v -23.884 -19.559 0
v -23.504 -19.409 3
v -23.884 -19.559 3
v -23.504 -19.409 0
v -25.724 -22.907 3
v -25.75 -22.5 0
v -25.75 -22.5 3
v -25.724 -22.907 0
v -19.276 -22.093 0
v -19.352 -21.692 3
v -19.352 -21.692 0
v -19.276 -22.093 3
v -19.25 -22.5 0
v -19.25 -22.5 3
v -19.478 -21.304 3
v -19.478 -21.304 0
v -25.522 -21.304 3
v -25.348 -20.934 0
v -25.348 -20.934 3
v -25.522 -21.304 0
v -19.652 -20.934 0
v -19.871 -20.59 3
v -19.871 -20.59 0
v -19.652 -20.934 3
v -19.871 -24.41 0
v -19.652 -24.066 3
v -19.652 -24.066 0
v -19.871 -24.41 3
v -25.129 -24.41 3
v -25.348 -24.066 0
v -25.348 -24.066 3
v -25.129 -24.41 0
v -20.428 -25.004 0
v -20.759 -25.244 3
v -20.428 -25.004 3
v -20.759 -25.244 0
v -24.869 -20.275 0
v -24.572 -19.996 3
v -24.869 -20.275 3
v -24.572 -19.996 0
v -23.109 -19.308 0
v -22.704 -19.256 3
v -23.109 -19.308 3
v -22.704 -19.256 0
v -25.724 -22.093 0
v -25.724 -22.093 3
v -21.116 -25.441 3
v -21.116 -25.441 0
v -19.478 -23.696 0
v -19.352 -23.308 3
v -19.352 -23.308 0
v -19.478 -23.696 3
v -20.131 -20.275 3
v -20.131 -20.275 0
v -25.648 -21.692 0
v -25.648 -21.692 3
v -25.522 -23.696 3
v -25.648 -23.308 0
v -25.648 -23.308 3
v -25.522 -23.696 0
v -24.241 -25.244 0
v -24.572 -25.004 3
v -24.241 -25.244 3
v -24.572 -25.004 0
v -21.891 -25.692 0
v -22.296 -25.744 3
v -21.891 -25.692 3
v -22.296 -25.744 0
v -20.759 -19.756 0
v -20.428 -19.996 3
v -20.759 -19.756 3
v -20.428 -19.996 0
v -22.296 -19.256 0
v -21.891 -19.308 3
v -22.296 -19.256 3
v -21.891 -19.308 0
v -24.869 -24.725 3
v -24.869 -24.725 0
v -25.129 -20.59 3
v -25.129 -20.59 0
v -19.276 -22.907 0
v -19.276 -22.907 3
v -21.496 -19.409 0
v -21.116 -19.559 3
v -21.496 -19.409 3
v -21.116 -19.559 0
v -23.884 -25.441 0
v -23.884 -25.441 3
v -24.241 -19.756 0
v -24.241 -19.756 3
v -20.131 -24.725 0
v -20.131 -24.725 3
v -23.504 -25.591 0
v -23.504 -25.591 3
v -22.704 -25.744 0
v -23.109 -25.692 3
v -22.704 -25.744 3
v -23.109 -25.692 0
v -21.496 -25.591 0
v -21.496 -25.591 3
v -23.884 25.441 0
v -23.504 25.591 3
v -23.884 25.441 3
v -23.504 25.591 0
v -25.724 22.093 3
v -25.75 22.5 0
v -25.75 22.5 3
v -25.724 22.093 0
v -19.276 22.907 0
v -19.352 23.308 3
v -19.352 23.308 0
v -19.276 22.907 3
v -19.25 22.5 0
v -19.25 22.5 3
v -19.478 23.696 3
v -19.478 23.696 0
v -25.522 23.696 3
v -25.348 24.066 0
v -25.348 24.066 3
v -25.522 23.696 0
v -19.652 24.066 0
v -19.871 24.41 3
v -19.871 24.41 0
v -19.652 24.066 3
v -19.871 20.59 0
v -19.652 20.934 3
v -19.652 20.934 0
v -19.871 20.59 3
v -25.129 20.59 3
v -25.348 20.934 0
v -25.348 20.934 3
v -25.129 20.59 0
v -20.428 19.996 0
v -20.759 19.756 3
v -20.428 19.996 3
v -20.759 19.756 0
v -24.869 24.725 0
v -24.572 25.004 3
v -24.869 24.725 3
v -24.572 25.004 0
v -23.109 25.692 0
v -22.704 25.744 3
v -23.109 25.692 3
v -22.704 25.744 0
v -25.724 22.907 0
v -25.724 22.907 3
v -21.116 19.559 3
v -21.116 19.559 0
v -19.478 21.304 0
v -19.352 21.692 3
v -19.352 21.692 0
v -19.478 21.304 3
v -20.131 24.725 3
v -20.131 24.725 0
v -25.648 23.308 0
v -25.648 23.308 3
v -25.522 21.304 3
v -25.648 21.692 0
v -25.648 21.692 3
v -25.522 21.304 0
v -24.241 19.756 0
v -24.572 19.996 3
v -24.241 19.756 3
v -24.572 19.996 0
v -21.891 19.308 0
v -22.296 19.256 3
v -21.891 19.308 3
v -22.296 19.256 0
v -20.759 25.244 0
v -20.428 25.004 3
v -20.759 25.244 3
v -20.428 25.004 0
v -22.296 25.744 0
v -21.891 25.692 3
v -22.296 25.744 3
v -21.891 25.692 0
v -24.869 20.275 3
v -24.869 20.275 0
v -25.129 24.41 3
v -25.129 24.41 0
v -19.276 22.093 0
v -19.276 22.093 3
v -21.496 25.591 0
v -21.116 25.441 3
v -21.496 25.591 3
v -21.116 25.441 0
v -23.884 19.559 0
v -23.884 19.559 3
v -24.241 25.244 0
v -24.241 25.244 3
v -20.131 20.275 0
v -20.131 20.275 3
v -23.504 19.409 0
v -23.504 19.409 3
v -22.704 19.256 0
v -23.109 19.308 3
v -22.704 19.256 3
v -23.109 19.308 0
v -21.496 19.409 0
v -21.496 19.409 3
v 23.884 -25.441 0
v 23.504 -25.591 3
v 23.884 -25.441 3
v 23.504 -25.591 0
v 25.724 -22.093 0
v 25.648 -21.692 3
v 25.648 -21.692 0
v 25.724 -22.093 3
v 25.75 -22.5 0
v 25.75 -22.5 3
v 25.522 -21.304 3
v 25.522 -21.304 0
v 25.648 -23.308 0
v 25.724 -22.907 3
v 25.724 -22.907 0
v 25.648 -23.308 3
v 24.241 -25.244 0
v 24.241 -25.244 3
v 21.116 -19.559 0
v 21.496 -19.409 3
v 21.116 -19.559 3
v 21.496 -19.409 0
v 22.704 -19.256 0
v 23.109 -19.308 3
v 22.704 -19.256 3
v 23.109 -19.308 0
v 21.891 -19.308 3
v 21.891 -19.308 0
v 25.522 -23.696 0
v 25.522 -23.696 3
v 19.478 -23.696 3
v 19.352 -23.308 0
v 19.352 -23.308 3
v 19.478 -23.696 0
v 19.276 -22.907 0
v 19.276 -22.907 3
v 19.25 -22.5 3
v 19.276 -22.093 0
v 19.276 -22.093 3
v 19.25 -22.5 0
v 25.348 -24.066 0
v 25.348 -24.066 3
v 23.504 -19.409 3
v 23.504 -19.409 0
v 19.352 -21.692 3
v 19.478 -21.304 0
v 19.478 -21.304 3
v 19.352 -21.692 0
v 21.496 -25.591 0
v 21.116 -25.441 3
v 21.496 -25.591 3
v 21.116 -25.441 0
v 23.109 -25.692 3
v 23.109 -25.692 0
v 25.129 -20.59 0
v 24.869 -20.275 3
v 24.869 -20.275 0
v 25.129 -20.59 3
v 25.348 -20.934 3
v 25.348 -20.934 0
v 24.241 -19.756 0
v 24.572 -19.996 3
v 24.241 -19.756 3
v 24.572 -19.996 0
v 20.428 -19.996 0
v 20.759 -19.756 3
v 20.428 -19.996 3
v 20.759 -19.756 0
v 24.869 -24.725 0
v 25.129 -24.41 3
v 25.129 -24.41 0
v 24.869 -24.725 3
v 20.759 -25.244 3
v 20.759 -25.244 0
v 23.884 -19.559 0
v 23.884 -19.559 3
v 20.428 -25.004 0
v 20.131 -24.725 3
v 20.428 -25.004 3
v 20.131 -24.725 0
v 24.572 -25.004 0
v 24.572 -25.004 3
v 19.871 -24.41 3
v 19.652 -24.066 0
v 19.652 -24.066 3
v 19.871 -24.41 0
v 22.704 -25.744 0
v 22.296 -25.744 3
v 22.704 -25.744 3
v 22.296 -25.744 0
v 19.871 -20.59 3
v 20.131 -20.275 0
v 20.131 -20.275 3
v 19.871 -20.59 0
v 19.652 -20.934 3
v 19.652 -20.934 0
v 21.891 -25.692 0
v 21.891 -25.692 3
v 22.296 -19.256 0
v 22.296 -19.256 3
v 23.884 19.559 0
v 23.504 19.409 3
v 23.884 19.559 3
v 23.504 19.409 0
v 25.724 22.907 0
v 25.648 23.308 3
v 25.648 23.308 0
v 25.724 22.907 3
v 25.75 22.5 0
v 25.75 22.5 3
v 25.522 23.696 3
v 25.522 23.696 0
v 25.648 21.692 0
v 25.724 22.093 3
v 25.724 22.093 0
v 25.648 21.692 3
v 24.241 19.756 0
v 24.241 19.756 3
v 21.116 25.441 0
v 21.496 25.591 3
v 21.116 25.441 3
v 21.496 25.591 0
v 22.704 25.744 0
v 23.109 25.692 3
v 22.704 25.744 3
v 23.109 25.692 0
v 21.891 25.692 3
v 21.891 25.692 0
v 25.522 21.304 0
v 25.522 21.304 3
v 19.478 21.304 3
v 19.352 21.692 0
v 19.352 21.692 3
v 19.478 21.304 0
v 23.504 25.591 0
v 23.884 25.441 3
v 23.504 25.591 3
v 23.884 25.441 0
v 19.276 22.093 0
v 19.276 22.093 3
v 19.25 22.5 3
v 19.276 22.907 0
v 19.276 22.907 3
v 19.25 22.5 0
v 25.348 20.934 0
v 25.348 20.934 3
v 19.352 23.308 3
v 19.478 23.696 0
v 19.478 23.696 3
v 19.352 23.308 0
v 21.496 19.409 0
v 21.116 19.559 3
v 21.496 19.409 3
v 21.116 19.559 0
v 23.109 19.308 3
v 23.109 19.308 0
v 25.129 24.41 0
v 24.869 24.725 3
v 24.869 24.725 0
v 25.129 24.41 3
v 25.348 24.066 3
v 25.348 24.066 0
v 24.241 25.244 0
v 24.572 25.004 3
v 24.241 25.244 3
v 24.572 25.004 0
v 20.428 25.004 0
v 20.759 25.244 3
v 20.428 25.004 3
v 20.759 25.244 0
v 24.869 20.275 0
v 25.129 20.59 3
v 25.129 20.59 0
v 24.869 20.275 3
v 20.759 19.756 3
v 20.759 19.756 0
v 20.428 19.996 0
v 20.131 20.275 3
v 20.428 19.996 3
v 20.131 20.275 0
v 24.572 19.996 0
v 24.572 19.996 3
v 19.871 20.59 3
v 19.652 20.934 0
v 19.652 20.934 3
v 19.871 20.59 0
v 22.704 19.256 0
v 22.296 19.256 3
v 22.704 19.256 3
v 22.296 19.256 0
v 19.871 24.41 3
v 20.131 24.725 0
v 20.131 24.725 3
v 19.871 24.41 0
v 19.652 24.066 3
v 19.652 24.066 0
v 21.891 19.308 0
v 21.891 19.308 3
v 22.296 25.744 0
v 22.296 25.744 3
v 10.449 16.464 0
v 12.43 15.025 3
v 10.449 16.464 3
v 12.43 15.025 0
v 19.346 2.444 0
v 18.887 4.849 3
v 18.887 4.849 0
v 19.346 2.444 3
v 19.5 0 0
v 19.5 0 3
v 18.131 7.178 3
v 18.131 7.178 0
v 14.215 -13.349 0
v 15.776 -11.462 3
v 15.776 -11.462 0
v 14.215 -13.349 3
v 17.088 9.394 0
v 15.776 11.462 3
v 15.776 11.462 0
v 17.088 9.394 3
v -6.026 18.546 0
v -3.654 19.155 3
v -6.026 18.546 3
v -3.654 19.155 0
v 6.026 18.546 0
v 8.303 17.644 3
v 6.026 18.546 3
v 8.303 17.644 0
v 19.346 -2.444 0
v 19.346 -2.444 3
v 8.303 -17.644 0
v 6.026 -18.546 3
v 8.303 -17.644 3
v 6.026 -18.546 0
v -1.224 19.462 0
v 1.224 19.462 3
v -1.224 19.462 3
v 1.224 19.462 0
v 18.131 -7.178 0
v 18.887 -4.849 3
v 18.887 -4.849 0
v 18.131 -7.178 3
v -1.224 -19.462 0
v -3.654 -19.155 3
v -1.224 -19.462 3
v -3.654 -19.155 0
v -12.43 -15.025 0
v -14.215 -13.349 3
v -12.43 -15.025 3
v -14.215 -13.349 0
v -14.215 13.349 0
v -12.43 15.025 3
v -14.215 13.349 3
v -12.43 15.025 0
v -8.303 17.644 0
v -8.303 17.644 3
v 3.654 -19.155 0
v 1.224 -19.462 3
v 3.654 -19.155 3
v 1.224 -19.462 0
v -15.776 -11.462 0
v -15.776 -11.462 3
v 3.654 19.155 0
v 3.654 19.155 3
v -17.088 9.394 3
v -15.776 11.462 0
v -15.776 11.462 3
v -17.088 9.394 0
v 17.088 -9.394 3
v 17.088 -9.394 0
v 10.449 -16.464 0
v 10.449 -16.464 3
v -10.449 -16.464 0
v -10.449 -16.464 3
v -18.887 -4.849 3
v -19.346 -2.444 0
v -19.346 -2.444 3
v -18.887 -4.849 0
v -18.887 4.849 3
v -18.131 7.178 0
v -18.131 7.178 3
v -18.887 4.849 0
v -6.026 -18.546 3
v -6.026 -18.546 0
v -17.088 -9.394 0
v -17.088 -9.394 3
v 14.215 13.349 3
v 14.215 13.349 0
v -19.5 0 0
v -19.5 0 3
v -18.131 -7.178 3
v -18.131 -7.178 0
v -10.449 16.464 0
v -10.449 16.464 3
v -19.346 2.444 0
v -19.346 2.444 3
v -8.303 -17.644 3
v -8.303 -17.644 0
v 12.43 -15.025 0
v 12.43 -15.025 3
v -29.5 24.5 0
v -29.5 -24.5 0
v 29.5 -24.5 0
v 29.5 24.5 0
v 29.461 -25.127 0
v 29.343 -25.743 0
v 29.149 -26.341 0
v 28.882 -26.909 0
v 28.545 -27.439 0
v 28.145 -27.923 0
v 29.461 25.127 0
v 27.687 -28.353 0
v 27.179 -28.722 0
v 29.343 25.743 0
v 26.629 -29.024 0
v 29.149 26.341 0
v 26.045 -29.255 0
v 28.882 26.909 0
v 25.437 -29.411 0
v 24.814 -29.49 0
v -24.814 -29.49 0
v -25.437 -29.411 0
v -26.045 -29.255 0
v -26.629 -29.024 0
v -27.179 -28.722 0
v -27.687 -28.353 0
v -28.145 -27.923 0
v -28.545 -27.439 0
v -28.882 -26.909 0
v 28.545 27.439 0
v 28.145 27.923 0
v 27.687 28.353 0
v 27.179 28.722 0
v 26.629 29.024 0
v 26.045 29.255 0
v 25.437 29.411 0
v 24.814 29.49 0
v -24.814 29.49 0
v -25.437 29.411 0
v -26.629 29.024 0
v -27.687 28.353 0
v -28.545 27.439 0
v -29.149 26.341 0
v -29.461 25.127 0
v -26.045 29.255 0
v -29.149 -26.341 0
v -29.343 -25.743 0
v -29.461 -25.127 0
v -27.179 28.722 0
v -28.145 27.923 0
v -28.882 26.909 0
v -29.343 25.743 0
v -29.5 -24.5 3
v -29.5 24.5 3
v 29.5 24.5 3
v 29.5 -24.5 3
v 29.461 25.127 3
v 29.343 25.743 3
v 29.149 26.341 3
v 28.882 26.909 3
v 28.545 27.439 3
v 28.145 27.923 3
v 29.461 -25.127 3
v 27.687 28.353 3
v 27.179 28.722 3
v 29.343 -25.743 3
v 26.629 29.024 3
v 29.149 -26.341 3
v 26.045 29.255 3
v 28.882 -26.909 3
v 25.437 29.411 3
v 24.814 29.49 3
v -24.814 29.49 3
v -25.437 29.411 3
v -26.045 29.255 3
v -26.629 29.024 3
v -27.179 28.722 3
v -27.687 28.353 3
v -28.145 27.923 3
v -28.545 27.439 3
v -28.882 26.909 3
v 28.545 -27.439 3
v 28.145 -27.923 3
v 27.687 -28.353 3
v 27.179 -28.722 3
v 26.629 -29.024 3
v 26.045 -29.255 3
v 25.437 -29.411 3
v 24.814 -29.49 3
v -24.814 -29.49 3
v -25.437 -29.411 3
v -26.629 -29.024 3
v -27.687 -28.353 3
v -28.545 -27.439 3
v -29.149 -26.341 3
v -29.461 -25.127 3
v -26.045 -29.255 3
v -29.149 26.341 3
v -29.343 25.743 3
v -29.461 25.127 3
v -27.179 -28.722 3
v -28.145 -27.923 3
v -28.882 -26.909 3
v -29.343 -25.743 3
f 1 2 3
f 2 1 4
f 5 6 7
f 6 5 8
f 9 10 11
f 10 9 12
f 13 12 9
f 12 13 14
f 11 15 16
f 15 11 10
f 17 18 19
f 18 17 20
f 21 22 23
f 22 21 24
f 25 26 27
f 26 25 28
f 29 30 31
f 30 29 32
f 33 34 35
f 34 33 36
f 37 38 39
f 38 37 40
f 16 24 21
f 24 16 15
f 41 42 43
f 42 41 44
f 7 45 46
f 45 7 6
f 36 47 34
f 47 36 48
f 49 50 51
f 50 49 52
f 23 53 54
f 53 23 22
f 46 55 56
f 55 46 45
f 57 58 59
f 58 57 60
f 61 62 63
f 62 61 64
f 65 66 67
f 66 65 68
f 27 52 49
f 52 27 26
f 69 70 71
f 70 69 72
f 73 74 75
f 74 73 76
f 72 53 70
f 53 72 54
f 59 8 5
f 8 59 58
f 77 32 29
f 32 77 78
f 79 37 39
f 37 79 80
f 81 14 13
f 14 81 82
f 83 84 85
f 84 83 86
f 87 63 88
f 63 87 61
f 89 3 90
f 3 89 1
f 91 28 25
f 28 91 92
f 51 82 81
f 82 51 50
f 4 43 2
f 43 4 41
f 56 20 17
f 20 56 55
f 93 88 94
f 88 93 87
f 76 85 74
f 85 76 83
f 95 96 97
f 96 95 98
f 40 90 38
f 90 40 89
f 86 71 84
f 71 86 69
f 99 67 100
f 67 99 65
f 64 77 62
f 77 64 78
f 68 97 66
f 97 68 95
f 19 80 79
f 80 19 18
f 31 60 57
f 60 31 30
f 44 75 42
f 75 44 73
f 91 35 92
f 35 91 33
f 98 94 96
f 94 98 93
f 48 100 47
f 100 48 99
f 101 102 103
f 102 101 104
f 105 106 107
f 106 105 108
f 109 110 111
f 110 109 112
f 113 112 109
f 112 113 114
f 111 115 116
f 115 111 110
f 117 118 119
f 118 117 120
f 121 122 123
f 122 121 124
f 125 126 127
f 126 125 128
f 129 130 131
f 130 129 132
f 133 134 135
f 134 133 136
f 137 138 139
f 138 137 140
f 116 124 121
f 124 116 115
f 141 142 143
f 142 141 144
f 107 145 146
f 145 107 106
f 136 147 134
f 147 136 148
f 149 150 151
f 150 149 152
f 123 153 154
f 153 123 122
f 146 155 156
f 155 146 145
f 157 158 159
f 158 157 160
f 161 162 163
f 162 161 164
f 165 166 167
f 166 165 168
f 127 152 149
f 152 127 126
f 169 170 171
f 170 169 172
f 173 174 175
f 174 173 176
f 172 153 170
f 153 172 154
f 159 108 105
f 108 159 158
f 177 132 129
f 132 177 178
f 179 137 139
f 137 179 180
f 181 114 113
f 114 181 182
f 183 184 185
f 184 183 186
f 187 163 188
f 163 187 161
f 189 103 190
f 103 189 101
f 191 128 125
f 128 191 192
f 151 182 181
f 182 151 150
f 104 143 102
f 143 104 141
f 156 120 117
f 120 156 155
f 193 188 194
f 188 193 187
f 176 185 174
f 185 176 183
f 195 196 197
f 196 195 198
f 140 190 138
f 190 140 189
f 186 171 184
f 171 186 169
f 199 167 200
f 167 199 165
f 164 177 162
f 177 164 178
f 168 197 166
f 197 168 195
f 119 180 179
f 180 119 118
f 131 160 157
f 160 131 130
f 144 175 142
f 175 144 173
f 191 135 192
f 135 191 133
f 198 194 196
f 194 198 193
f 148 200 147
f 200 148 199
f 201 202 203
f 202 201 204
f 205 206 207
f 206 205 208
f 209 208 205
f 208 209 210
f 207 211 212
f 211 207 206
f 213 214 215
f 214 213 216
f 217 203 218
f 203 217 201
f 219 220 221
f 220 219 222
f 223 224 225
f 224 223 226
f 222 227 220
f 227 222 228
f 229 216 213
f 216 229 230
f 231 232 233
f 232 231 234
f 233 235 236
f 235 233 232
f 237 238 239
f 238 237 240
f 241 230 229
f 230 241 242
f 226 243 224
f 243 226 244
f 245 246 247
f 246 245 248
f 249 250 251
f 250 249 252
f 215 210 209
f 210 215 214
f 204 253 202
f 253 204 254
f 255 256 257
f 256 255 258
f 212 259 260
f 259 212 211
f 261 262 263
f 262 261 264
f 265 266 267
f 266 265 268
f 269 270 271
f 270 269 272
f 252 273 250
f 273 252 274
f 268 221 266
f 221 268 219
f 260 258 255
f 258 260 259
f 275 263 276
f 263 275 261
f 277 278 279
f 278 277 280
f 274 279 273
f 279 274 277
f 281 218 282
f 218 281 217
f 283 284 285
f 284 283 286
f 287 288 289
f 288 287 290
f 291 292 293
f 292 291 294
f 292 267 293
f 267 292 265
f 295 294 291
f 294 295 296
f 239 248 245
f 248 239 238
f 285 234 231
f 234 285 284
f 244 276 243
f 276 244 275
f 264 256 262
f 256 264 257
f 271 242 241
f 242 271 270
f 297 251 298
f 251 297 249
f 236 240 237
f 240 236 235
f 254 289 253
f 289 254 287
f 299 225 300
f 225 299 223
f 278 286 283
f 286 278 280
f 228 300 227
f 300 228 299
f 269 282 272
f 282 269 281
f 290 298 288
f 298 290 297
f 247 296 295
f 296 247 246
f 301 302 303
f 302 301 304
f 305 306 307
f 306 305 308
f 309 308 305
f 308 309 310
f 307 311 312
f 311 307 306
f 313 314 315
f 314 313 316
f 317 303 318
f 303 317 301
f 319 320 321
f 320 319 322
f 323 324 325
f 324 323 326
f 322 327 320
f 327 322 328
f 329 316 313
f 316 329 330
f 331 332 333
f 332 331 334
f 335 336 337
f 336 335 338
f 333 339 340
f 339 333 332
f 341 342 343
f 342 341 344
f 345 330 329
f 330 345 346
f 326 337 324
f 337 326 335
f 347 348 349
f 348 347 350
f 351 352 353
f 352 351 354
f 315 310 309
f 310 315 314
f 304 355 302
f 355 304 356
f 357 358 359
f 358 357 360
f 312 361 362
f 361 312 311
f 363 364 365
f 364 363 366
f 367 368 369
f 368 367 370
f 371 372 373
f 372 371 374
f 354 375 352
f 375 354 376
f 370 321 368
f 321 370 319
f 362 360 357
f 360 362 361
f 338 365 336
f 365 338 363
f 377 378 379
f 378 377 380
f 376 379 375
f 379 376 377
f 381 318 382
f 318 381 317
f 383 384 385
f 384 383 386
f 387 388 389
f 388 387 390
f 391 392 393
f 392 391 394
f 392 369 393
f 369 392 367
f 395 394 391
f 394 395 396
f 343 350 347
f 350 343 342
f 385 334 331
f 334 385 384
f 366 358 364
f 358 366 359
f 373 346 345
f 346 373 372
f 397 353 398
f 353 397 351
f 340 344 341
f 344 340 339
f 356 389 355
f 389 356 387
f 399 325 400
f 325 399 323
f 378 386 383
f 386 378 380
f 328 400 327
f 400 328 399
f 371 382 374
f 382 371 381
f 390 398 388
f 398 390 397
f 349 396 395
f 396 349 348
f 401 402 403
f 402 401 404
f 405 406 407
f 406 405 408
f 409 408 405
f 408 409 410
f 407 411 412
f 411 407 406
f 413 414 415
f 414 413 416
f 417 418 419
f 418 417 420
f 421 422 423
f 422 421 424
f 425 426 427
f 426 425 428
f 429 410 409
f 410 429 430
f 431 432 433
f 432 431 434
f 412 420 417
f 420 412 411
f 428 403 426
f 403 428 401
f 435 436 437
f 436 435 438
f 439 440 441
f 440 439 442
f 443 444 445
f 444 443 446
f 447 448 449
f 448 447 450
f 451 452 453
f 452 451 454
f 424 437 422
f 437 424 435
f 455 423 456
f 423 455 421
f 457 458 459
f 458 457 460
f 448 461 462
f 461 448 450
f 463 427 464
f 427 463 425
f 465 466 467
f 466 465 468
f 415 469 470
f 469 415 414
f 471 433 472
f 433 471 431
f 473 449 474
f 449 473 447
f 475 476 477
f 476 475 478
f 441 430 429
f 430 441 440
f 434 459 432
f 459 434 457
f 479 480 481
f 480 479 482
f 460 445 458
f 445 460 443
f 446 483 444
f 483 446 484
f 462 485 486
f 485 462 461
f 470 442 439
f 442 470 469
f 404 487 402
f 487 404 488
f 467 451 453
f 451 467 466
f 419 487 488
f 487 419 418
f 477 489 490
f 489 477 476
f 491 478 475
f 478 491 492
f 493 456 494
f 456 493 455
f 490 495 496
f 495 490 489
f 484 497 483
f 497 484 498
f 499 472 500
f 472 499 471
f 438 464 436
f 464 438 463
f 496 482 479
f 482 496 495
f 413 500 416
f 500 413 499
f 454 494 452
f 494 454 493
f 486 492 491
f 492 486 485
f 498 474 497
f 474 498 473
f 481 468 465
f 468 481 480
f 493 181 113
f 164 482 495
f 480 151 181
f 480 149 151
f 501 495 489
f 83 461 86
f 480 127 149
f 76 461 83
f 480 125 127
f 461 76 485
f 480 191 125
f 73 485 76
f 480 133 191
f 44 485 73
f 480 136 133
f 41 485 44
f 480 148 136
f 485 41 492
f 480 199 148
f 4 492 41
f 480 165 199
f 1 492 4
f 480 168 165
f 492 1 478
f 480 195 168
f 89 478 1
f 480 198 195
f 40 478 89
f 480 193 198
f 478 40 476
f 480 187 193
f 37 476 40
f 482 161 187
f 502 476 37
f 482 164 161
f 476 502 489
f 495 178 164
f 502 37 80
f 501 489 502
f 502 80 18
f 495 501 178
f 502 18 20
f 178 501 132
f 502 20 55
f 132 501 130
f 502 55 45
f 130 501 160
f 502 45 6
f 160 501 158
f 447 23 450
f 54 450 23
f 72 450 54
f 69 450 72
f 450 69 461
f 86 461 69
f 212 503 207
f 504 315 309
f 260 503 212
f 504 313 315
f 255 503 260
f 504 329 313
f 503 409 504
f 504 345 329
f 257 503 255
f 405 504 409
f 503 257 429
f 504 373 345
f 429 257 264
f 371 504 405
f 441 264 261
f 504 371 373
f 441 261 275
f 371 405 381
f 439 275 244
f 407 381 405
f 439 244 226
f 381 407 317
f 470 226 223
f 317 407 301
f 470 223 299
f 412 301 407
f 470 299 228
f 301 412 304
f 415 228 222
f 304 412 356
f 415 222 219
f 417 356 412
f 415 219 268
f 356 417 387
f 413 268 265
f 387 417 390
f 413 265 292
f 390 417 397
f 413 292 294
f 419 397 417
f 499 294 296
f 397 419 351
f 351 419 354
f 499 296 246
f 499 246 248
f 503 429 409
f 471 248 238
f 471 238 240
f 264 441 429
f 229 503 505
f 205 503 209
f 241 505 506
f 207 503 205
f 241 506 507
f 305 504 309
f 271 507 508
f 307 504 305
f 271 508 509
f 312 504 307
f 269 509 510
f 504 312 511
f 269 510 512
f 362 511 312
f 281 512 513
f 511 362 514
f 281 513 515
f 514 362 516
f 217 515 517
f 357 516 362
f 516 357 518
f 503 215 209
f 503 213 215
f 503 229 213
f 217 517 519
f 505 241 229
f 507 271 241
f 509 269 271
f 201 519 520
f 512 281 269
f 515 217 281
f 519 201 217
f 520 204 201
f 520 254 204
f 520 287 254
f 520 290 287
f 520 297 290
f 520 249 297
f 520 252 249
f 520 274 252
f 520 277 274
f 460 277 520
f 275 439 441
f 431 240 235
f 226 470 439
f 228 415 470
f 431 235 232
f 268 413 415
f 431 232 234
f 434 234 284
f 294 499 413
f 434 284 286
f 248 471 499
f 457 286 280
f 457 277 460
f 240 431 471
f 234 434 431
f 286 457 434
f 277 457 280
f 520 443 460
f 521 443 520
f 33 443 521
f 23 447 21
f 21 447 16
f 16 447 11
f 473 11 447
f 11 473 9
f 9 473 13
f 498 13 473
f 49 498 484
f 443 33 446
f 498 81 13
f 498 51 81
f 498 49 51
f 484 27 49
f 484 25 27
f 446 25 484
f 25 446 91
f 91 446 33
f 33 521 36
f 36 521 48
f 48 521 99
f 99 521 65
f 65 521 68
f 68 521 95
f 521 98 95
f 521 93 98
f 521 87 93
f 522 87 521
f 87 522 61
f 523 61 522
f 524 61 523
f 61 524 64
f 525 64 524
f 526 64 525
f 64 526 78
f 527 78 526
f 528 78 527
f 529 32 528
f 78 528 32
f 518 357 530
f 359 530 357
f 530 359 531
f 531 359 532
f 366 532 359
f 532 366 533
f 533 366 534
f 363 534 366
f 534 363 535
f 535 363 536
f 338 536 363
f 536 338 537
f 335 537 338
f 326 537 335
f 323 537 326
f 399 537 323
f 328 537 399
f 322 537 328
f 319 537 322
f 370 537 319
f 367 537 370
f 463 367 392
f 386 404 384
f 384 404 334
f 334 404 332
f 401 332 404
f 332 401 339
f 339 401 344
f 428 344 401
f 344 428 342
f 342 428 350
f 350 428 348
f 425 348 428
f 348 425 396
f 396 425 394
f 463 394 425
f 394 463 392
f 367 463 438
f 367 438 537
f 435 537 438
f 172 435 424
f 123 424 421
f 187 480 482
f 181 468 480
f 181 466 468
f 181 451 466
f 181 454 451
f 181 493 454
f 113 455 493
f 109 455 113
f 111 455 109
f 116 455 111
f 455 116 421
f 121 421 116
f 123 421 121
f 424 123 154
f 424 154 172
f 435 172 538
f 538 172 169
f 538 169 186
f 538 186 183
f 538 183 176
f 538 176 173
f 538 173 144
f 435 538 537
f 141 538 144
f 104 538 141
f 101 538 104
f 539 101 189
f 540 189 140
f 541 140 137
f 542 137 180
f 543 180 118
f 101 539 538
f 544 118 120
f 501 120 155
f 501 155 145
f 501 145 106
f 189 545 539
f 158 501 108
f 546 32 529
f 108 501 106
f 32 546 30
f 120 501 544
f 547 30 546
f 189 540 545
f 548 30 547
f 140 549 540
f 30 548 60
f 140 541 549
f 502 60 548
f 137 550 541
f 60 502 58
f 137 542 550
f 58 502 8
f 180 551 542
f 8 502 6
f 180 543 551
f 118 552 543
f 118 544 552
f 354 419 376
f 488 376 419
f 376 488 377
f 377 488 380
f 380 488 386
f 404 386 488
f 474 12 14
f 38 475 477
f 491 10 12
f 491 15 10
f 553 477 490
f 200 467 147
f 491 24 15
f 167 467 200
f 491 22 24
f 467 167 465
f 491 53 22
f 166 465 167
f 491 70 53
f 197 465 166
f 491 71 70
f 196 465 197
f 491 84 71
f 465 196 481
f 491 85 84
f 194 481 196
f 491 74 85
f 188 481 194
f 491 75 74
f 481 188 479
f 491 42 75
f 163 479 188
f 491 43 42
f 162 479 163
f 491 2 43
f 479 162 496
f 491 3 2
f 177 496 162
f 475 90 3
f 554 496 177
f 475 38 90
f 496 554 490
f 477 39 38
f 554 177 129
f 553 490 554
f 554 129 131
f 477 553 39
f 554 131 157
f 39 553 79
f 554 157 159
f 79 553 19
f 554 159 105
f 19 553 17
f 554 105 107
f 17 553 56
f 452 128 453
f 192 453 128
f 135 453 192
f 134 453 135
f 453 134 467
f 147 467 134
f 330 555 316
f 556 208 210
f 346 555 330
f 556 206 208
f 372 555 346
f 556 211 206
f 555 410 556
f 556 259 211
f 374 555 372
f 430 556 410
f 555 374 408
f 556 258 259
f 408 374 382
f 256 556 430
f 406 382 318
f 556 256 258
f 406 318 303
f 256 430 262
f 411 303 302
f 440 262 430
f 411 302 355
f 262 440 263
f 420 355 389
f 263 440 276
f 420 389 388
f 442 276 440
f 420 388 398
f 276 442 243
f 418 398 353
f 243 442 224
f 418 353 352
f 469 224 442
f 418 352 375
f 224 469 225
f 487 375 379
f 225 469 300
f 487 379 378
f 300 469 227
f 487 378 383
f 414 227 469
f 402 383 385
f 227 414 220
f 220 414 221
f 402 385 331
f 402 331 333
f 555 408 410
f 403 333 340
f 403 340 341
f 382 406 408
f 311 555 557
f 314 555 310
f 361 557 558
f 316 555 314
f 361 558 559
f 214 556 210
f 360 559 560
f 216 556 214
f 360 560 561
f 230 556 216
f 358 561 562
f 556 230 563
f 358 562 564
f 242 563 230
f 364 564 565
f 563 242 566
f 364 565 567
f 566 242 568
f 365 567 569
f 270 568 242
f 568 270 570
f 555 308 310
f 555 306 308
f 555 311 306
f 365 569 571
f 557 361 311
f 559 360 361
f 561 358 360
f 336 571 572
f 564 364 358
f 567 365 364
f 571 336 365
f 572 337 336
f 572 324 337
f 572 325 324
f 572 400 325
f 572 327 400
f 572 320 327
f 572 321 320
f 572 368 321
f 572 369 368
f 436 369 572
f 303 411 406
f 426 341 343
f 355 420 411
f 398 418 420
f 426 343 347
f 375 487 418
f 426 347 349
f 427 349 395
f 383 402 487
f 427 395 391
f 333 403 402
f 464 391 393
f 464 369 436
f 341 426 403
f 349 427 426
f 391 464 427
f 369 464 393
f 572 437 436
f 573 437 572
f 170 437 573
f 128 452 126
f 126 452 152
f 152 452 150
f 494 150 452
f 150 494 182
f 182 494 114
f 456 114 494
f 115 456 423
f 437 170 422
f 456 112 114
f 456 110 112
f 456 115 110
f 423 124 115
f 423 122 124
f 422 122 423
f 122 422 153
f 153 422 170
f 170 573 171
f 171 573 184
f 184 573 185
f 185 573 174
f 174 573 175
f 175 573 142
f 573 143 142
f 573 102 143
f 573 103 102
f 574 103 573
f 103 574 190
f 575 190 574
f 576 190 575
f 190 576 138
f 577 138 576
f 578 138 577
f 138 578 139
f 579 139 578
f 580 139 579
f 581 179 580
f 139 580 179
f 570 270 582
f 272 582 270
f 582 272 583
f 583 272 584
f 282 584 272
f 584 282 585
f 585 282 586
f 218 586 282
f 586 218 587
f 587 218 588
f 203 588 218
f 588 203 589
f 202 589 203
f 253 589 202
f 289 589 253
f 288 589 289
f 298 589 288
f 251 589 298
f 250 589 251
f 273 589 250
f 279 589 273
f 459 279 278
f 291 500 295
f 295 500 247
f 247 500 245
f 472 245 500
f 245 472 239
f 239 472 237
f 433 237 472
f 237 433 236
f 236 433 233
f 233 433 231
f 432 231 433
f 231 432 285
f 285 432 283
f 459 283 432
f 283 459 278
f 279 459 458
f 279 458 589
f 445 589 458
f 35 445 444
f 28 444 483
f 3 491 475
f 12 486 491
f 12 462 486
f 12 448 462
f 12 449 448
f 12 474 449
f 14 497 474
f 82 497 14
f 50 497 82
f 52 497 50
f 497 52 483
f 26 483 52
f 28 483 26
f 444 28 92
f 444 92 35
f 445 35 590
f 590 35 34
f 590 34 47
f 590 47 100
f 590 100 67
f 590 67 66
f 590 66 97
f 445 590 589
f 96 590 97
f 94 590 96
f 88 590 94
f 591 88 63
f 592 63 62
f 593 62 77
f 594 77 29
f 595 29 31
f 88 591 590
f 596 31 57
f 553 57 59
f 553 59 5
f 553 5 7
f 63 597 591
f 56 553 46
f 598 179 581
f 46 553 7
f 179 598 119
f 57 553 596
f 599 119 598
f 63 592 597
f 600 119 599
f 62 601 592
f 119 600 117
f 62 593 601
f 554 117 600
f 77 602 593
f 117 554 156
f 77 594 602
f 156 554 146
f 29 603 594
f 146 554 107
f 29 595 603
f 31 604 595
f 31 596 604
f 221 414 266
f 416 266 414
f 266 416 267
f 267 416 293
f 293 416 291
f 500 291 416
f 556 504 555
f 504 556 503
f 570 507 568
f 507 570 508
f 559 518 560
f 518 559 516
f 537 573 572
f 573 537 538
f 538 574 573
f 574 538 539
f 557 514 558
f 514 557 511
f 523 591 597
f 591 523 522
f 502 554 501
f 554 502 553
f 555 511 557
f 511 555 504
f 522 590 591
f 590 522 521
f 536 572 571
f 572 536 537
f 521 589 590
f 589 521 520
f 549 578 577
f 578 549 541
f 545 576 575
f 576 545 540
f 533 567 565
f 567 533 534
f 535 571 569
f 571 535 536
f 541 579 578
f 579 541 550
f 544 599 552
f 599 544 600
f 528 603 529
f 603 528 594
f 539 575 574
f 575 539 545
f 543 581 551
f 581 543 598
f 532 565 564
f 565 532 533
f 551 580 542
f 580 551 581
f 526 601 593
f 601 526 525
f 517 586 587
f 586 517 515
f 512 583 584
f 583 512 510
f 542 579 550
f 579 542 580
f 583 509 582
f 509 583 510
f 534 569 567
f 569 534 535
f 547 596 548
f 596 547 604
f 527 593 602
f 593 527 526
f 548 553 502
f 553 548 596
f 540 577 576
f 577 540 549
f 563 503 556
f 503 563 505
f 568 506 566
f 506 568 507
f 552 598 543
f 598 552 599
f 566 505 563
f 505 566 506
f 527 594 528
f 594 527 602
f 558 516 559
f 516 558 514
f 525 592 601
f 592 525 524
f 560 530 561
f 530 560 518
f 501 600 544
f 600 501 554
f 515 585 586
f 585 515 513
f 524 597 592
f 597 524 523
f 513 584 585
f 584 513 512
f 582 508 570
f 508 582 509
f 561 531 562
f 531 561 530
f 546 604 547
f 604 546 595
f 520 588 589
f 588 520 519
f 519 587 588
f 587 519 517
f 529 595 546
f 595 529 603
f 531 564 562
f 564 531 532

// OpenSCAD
$fn = 50;

difference() {
	union() {
		hull() {
			translate(v = [-24.5, 24.5, 0]) {
				cylinder(h = 3, r = 5);
			}
			translate(v = [24.5, 24.5, 0]) {
				cylinder(h = 3, r = 5);
			}
			translate(v = [-24.5, -24.5, 0]) {
				cylinder(h = 3, r = 5);
			}
			translate(v = [24.5, -24.5, 0]) {
				cylinder(h = 3, r = 5);
			}
		}
	}
	union() {
		translate(v = [-22.5, -22.5, -100.0]) {
			cylinder(h = 200, r = 3.25);
		}
		translate(v = [-22.5, 22.5, -100.0]) {
			cylinder(h = 200, r = 3.25);
		}
		translate(v = [22.5, -22.5, -100.0]) {
			cylinder(h = 200, r = 3.25);
		}
		translate(v = [22.5, 22.5, -100.0]) {
			cylinder(h = 200, r = 3.25);
		}
		translate(v = [-22.5, -22.5, -100.0]) {
			cylinder(h = 200, r = 1.8);
		}
		translate(v = [-22.5, 22.5, -100.0]) {
			cylinder(h = 200, r = 1.8);
		}
		translate(v = [22.5, -22.5, -100.0]) {
			cylinder(h = 200, r = 1.8);
		}
		translate(v = [22.5, 22.5, -100.0]) {
			cylinder(h = 200, r = 1.8);
		}
		cylinder(h = 3, r = 19.5);
	}
}
